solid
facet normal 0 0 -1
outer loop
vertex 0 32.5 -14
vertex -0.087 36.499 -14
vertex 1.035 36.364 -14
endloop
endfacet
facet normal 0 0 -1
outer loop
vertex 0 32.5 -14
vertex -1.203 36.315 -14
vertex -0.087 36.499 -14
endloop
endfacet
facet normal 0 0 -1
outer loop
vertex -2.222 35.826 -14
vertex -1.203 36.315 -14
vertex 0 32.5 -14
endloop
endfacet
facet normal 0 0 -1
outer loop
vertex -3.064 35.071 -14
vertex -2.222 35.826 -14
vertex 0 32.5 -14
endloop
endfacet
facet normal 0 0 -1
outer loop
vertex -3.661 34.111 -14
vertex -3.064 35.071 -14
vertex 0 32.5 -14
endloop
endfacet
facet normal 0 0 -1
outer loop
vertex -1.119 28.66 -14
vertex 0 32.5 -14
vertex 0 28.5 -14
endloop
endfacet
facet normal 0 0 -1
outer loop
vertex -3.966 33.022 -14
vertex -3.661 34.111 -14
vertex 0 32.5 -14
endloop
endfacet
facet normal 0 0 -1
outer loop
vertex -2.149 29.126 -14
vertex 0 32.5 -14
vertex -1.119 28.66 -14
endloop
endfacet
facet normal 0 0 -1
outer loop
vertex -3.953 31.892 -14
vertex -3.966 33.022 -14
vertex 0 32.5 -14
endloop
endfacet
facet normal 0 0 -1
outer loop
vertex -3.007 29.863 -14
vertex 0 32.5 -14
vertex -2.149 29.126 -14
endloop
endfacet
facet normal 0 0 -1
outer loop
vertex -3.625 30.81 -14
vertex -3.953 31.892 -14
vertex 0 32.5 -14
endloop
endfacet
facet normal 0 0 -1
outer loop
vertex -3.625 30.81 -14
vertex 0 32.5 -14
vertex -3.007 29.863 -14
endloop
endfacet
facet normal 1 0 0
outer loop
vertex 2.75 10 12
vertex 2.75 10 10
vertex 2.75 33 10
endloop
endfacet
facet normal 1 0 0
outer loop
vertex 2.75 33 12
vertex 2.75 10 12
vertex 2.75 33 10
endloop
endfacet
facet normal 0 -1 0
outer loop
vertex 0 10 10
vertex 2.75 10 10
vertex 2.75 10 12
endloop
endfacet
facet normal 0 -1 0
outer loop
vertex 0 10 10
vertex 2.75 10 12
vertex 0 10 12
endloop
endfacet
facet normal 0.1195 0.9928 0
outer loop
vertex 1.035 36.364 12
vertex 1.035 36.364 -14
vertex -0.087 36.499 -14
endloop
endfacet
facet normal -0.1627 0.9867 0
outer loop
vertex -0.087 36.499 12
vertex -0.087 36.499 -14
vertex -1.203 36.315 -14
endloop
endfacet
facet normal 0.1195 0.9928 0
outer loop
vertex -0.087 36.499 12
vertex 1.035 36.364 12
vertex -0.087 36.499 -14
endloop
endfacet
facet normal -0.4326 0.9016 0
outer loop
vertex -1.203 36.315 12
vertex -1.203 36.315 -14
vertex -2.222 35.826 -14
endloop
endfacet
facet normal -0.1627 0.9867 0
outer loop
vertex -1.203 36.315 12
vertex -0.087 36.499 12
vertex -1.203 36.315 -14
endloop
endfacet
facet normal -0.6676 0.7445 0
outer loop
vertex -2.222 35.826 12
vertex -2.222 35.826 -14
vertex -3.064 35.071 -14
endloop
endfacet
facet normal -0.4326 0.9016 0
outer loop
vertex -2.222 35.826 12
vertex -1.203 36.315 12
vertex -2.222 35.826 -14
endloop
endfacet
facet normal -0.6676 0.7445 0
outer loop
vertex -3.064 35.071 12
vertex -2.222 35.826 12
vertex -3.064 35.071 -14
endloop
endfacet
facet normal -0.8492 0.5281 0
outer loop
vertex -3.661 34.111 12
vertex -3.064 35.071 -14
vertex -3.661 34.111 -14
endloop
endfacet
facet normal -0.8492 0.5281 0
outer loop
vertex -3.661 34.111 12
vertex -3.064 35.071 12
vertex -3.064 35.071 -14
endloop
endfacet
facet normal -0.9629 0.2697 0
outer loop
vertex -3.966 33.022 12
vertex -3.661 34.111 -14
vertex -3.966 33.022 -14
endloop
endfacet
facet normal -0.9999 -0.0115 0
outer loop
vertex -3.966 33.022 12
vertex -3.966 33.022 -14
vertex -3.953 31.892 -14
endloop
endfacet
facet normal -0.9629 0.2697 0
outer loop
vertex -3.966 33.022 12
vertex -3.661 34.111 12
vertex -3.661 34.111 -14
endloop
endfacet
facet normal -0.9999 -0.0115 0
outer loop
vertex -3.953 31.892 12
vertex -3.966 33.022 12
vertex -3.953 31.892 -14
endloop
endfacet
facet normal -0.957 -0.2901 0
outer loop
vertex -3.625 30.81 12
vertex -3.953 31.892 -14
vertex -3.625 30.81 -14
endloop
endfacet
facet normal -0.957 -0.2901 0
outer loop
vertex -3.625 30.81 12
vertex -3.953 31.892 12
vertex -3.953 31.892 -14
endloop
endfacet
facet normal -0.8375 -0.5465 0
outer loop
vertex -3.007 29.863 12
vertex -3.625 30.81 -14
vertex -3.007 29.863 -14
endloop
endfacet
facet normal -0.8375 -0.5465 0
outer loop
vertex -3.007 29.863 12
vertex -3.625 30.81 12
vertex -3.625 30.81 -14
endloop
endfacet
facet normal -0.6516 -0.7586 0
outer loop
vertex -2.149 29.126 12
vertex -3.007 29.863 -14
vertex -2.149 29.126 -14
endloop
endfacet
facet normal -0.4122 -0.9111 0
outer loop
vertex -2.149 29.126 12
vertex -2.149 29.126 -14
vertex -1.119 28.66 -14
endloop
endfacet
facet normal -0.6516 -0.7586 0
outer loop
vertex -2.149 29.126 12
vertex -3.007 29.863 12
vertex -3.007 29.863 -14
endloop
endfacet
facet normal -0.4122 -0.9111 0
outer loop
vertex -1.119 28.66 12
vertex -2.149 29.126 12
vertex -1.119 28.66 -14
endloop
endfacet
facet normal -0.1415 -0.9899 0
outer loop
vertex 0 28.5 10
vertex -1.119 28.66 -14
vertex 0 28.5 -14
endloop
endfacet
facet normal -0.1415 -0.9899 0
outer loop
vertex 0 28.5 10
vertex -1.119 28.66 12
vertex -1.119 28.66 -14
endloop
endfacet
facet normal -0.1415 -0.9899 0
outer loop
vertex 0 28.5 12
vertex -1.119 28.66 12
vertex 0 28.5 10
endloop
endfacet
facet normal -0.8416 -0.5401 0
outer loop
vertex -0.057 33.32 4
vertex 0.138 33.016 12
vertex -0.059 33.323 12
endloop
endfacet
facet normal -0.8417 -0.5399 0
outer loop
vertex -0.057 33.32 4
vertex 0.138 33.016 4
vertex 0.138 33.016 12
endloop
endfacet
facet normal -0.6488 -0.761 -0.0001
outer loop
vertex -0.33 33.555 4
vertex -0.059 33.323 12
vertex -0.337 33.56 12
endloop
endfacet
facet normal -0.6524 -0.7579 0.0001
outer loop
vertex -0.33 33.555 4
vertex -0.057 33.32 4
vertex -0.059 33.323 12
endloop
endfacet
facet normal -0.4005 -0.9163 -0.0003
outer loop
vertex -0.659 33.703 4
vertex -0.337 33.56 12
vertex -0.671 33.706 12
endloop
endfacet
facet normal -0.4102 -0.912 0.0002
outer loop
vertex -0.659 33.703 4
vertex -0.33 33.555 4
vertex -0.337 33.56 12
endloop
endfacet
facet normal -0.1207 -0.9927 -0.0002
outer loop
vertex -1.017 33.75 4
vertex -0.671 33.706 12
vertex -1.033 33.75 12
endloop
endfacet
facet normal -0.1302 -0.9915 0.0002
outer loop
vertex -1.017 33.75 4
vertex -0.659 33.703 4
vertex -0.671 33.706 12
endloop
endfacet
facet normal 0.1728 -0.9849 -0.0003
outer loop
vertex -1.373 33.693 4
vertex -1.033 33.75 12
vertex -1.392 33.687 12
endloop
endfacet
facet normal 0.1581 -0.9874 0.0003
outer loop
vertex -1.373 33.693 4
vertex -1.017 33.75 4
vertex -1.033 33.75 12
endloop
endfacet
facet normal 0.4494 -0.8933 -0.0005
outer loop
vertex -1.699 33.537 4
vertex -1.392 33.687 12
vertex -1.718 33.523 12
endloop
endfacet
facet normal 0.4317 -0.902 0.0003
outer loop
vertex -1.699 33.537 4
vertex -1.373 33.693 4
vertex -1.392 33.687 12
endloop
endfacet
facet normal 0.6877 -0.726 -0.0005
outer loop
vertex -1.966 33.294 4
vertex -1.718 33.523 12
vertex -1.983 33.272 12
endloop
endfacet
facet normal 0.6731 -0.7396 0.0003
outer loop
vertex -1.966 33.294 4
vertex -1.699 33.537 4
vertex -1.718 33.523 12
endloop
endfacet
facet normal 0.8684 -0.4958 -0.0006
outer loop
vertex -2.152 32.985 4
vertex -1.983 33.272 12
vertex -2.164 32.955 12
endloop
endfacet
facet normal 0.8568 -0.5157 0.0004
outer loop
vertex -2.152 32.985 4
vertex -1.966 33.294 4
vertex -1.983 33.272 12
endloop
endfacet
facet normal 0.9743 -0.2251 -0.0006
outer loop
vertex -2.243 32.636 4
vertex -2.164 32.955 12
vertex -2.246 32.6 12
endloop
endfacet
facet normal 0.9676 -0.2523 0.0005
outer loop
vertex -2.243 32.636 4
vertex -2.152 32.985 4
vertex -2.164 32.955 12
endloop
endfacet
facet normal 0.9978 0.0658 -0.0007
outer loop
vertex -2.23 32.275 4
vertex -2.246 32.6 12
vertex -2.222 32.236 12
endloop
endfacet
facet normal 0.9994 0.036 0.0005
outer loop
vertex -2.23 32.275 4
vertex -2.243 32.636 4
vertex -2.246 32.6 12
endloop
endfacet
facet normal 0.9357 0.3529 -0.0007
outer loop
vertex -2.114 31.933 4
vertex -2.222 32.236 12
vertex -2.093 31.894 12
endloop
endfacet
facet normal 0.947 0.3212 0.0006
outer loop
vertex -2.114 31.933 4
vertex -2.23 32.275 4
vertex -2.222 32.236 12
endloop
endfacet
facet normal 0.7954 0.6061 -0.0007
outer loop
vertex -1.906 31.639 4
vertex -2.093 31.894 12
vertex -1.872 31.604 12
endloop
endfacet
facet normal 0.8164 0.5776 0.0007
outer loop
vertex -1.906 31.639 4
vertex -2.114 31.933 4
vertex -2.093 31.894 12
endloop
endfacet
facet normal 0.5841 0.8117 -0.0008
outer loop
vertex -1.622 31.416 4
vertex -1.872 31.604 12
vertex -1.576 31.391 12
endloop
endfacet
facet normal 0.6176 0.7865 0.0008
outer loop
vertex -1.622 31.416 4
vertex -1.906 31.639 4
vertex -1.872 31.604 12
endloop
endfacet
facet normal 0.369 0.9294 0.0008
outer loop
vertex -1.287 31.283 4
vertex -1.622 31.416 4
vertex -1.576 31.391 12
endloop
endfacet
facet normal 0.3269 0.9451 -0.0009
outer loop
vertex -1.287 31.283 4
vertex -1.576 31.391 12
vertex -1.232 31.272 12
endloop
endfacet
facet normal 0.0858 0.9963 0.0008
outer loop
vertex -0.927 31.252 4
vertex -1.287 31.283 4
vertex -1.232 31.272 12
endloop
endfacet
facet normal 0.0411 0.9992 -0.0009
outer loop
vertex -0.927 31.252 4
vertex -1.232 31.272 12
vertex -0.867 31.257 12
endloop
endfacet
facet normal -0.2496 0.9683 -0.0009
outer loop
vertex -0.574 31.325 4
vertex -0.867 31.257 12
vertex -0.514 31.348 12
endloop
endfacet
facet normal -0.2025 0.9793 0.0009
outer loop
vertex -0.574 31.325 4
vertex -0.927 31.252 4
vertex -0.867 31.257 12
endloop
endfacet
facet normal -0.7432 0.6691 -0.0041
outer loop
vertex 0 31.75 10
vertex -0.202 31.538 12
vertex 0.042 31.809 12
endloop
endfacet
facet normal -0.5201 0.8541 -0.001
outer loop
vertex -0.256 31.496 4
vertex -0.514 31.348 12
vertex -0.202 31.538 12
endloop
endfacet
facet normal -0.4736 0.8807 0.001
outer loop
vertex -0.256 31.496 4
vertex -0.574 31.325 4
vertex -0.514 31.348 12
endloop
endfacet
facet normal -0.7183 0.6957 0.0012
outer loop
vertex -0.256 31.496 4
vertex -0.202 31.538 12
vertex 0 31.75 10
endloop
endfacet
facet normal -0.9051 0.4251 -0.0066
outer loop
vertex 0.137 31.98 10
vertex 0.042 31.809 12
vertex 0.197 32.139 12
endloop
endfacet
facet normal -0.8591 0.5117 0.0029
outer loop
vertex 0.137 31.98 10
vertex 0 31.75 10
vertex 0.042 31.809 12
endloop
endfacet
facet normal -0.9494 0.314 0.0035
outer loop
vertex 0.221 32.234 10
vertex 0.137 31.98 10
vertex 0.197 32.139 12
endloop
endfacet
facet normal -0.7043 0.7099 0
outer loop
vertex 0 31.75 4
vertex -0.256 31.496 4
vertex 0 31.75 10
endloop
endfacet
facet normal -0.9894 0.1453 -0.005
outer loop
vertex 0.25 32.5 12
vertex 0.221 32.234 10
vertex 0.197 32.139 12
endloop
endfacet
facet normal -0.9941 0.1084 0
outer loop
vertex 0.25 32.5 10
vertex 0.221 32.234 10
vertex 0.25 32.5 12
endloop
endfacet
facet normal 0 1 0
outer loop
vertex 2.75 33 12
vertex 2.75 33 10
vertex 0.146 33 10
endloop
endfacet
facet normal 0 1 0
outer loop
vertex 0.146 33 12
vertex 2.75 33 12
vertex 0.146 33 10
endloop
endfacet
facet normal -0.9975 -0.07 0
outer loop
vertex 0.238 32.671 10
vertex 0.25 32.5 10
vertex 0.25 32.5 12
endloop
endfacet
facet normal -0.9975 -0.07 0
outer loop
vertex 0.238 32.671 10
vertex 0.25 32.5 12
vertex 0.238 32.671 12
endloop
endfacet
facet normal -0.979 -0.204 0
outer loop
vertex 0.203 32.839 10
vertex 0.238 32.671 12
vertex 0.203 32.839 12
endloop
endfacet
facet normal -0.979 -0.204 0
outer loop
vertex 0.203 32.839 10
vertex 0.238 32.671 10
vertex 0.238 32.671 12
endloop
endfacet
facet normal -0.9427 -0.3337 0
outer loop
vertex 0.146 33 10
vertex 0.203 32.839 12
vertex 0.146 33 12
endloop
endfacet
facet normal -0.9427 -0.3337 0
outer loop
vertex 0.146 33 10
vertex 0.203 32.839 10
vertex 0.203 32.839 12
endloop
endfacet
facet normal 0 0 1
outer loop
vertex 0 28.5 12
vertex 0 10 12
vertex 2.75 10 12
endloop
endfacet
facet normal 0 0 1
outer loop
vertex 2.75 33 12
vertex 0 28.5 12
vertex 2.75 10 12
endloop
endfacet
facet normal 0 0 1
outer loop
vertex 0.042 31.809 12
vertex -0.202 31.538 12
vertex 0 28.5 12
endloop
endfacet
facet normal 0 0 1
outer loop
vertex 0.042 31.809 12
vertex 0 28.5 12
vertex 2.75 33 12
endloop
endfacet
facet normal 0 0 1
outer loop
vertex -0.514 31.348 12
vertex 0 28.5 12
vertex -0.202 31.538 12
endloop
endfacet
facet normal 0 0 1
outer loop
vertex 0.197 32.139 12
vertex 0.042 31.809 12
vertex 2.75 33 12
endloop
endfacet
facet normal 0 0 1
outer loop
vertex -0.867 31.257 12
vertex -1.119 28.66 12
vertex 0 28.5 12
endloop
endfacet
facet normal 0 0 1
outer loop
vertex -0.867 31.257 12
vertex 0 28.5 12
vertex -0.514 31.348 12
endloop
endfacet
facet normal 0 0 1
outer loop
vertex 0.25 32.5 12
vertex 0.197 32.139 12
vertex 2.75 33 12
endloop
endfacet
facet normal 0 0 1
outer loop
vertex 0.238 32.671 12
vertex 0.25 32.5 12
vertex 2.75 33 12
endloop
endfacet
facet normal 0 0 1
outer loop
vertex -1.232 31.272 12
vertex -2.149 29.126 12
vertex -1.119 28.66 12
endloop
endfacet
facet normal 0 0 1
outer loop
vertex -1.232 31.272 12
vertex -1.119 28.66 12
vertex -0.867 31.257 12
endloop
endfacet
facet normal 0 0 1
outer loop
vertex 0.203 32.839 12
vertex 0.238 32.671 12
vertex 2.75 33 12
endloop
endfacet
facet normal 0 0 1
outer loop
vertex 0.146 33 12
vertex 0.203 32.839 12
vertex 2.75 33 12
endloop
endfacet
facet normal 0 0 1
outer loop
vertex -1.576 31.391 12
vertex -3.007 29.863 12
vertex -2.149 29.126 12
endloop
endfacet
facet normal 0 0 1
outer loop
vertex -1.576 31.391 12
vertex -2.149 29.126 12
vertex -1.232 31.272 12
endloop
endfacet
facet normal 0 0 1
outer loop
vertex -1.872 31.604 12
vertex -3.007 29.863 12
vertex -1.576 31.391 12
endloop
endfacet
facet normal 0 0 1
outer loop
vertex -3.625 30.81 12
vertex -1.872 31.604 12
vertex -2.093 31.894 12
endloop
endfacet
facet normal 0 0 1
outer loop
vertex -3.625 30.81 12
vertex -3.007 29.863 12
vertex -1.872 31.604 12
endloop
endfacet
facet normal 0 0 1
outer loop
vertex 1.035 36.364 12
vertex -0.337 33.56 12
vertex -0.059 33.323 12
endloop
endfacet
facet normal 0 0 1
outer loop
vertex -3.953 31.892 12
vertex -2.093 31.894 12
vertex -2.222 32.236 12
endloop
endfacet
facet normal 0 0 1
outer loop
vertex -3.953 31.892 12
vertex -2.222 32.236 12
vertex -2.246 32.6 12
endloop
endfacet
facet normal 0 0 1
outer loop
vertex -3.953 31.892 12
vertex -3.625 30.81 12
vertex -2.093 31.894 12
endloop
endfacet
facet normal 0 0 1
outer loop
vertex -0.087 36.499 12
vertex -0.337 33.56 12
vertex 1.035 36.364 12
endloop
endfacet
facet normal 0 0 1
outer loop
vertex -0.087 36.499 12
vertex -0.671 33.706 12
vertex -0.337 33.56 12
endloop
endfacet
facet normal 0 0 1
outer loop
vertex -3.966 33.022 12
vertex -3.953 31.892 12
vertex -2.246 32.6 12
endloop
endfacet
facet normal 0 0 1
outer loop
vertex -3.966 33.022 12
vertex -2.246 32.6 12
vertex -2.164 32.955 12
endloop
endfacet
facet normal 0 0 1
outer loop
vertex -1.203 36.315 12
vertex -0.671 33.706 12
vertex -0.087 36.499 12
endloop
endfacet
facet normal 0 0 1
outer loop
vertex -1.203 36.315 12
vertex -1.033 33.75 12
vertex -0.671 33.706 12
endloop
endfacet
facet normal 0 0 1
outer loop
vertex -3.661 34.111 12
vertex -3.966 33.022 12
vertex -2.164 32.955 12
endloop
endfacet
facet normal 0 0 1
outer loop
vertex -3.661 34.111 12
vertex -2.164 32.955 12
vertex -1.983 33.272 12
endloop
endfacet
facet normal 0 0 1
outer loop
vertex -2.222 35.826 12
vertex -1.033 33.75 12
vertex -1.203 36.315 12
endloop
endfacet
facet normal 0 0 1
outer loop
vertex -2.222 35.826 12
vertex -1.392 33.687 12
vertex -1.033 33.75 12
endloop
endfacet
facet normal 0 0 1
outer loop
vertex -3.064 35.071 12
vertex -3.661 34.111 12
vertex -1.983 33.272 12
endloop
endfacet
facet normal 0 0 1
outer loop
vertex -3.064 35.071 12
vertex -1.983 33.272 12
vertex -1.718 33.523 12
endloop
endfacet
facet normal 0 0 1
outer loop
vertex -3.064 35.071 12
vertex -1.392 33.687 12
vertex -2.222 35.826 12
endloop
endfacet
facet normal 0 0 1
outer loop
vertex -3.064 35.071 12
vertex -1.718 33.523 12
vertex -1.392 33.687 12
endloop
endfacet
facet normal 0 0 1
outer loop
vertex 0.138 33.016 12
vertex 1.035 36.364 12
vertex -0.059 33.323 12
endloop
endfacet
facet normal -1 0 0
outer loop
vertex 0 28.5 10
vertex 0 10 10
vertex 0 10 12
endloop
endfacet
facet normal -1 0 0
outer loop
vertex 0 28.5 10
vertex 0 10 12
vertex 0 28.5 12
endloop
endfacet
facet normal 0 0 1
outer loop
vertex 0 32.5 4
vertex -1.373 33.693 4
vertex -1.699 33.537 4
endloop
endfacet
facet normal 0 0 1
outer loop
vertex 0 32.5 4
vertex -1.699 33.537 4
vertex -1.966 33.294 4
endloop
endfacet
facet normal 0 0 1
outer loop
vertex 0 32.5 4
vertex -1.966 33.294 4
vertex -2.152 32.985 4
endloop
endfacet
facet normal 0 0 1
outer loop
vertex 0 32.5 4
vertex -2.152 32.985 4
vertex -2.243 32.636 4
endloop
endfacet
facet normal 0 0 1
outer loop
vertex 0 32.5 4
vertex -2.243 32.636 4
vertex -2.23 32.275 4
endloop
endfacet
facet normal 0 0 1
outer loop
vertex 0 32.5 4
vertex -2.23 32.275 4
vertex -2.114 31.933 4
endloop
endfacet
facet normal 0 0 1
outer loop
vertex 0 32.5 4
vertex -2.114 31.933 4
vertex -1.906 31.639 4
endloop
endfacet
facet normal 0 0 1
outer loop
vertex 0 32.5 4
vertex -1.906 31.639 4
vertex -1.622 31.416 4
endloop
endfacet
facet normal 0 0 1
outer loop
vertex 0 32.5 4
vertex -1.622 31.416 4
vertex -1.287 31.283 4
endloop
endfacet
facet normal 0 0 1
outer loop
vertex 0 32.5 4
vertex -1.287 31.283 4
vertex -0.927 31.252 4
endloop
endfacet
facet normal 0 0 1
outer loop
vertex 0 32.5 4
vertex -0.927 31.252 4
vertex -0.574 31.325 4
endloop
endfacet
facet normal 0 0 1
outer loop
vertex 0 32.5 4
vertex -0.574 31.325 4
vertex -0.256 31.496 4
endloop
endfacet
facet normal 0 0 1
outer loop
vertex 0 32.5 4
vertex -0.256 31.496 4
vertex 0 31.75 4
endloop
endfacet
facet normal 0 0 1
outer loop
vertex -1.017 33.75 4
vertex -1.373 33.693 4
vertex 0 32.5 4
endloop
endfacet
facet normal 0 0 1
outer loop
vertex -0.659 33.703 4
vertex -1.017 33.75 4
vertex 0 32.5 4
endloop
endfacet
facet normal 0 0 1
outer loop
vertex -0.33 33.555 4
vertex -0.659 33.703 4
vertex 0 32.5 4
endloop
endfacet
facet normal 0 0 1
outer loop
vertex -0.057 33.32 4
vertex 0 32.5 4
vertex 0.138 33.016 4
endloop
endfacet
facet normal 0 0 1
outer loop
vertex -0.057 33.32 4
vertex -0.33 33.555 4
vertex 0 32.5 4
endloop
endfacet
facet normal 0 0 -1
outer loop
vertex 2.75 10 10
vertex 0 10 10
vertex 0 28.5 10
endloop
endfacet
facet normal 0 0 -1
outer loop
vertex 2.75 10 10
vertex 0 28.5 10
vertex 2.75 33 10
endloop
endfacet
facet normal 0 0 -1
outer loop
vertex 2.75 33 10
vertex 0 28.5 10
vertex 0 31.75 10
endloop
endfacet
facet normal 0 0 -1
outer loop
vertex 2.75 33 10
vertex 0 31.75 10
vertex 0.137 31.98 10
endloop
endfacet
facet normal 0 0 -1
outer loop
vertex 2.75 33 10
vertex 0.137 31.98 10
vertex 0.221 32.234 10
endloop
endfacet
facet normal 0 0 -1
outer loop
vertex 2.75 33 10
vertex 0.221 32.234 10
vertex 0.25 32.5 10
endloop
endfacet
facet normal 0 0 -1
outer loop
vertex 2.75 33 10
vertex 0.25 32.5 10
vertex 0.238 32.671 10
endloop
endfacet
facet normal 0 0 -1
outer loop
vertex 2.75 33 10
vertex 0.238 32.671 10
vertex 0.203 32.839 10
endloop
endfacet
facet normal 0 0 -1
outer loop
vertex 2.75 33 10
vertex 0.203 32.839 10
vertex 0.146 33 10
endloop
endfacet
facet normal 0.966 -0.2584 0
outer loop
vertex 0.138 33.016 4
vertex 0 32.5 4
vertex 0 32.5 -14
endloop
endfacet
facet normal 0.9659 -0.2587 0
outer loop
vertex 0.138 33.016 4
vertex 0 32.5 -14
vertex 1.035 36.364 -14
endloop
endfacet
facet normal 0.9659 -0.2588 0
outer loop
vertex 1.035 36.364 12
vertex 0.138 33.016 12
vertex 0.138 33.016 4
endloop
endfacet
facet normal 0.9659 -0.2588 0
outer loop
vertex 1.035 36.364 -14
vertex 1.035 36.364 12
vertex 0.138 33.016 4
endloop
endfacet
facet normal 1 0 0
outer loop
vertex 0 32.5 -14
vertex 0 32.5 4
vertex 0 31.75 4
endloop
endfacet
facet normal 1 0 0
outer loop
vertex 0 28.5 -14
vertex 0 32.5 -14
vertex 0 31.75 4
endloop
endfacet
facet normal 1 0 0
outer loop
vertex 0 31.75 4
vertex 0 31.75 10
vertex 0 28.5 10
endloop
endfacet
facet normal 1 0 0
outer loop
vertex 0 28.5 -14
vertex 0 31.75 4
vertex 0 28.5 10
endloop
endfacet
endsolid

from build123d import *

# Parameters (mm, degrees)
CYLINDER006_R               = 1.25
CYLINDER006_DEPTH           = 10
BOX004_W                    = 23
BOX004_H                    = 2.75
BOX004_DEPTH                = 2
CYLINDER001_W               = 4
CYLINDER001_H               = 26
CYLINDER001_ANGLE           = 195
CYLINDER001_PLACEMENT_ANGLE = 75


with BuildPart() as b_nw:
    # Cylinder006 → Cylinder006 (new body)
    with BuildSketch(Plane(origin=(-1, 12.5, 4), x_dir=(1, 0, 0), z_dir=(0, 0, 1))):
        Circle(CYLINDER006_R)
    extrude(amount=CYLINDER006_DEPTH)


with BuildPart() as w012:
    # Box004 → Box004 (new body)
    with BuildSketch(Plane(origin=(2.75, -10, 10), x_dir=(0, 1, 0), z_dir=(0, 0, 1))):
        with Locations((11.5, 1.375)):
            Rectangle(BOX004_W, BOX004_H)
    extrude(amount=BOX004_DEPTH)


with BuildPart() as cut003_w:
    # Cylinder001 → Cylinder001 (revolve)
    with BuildSketch(Plane.XZ):
        with Locations((2, 13)):
            Rectangle(CYLINDER001_W, CYLINDER001_H)
    revolve(axis=Axis((0, 0, 0), (0, 0, 1)), revolution_arc=CYLINDER001_ANGLE)


with BuildPart() as cut003_w_1:
    # Cylinder001 placement: moved
    add(cut003_w.part.moved(Location((0, 12.5, -14))).rotate(Axis((0, 12.5, -14), (0, 0, 1)), CYLINDER001_PLACEMENT_ANGLE))

    # Fusion003: union W012
    add(w012.part)

    # Cut003: cut B_NW
    add(b_nw.part, mode=Mode.SUBTRACT)


with BuildPart() as cut003_w_2:
    # Cut003 placement: moved
    add(cut003_w_1.part.moved(Location((0, 20, 0))))


solid = cut003_w_2.part
